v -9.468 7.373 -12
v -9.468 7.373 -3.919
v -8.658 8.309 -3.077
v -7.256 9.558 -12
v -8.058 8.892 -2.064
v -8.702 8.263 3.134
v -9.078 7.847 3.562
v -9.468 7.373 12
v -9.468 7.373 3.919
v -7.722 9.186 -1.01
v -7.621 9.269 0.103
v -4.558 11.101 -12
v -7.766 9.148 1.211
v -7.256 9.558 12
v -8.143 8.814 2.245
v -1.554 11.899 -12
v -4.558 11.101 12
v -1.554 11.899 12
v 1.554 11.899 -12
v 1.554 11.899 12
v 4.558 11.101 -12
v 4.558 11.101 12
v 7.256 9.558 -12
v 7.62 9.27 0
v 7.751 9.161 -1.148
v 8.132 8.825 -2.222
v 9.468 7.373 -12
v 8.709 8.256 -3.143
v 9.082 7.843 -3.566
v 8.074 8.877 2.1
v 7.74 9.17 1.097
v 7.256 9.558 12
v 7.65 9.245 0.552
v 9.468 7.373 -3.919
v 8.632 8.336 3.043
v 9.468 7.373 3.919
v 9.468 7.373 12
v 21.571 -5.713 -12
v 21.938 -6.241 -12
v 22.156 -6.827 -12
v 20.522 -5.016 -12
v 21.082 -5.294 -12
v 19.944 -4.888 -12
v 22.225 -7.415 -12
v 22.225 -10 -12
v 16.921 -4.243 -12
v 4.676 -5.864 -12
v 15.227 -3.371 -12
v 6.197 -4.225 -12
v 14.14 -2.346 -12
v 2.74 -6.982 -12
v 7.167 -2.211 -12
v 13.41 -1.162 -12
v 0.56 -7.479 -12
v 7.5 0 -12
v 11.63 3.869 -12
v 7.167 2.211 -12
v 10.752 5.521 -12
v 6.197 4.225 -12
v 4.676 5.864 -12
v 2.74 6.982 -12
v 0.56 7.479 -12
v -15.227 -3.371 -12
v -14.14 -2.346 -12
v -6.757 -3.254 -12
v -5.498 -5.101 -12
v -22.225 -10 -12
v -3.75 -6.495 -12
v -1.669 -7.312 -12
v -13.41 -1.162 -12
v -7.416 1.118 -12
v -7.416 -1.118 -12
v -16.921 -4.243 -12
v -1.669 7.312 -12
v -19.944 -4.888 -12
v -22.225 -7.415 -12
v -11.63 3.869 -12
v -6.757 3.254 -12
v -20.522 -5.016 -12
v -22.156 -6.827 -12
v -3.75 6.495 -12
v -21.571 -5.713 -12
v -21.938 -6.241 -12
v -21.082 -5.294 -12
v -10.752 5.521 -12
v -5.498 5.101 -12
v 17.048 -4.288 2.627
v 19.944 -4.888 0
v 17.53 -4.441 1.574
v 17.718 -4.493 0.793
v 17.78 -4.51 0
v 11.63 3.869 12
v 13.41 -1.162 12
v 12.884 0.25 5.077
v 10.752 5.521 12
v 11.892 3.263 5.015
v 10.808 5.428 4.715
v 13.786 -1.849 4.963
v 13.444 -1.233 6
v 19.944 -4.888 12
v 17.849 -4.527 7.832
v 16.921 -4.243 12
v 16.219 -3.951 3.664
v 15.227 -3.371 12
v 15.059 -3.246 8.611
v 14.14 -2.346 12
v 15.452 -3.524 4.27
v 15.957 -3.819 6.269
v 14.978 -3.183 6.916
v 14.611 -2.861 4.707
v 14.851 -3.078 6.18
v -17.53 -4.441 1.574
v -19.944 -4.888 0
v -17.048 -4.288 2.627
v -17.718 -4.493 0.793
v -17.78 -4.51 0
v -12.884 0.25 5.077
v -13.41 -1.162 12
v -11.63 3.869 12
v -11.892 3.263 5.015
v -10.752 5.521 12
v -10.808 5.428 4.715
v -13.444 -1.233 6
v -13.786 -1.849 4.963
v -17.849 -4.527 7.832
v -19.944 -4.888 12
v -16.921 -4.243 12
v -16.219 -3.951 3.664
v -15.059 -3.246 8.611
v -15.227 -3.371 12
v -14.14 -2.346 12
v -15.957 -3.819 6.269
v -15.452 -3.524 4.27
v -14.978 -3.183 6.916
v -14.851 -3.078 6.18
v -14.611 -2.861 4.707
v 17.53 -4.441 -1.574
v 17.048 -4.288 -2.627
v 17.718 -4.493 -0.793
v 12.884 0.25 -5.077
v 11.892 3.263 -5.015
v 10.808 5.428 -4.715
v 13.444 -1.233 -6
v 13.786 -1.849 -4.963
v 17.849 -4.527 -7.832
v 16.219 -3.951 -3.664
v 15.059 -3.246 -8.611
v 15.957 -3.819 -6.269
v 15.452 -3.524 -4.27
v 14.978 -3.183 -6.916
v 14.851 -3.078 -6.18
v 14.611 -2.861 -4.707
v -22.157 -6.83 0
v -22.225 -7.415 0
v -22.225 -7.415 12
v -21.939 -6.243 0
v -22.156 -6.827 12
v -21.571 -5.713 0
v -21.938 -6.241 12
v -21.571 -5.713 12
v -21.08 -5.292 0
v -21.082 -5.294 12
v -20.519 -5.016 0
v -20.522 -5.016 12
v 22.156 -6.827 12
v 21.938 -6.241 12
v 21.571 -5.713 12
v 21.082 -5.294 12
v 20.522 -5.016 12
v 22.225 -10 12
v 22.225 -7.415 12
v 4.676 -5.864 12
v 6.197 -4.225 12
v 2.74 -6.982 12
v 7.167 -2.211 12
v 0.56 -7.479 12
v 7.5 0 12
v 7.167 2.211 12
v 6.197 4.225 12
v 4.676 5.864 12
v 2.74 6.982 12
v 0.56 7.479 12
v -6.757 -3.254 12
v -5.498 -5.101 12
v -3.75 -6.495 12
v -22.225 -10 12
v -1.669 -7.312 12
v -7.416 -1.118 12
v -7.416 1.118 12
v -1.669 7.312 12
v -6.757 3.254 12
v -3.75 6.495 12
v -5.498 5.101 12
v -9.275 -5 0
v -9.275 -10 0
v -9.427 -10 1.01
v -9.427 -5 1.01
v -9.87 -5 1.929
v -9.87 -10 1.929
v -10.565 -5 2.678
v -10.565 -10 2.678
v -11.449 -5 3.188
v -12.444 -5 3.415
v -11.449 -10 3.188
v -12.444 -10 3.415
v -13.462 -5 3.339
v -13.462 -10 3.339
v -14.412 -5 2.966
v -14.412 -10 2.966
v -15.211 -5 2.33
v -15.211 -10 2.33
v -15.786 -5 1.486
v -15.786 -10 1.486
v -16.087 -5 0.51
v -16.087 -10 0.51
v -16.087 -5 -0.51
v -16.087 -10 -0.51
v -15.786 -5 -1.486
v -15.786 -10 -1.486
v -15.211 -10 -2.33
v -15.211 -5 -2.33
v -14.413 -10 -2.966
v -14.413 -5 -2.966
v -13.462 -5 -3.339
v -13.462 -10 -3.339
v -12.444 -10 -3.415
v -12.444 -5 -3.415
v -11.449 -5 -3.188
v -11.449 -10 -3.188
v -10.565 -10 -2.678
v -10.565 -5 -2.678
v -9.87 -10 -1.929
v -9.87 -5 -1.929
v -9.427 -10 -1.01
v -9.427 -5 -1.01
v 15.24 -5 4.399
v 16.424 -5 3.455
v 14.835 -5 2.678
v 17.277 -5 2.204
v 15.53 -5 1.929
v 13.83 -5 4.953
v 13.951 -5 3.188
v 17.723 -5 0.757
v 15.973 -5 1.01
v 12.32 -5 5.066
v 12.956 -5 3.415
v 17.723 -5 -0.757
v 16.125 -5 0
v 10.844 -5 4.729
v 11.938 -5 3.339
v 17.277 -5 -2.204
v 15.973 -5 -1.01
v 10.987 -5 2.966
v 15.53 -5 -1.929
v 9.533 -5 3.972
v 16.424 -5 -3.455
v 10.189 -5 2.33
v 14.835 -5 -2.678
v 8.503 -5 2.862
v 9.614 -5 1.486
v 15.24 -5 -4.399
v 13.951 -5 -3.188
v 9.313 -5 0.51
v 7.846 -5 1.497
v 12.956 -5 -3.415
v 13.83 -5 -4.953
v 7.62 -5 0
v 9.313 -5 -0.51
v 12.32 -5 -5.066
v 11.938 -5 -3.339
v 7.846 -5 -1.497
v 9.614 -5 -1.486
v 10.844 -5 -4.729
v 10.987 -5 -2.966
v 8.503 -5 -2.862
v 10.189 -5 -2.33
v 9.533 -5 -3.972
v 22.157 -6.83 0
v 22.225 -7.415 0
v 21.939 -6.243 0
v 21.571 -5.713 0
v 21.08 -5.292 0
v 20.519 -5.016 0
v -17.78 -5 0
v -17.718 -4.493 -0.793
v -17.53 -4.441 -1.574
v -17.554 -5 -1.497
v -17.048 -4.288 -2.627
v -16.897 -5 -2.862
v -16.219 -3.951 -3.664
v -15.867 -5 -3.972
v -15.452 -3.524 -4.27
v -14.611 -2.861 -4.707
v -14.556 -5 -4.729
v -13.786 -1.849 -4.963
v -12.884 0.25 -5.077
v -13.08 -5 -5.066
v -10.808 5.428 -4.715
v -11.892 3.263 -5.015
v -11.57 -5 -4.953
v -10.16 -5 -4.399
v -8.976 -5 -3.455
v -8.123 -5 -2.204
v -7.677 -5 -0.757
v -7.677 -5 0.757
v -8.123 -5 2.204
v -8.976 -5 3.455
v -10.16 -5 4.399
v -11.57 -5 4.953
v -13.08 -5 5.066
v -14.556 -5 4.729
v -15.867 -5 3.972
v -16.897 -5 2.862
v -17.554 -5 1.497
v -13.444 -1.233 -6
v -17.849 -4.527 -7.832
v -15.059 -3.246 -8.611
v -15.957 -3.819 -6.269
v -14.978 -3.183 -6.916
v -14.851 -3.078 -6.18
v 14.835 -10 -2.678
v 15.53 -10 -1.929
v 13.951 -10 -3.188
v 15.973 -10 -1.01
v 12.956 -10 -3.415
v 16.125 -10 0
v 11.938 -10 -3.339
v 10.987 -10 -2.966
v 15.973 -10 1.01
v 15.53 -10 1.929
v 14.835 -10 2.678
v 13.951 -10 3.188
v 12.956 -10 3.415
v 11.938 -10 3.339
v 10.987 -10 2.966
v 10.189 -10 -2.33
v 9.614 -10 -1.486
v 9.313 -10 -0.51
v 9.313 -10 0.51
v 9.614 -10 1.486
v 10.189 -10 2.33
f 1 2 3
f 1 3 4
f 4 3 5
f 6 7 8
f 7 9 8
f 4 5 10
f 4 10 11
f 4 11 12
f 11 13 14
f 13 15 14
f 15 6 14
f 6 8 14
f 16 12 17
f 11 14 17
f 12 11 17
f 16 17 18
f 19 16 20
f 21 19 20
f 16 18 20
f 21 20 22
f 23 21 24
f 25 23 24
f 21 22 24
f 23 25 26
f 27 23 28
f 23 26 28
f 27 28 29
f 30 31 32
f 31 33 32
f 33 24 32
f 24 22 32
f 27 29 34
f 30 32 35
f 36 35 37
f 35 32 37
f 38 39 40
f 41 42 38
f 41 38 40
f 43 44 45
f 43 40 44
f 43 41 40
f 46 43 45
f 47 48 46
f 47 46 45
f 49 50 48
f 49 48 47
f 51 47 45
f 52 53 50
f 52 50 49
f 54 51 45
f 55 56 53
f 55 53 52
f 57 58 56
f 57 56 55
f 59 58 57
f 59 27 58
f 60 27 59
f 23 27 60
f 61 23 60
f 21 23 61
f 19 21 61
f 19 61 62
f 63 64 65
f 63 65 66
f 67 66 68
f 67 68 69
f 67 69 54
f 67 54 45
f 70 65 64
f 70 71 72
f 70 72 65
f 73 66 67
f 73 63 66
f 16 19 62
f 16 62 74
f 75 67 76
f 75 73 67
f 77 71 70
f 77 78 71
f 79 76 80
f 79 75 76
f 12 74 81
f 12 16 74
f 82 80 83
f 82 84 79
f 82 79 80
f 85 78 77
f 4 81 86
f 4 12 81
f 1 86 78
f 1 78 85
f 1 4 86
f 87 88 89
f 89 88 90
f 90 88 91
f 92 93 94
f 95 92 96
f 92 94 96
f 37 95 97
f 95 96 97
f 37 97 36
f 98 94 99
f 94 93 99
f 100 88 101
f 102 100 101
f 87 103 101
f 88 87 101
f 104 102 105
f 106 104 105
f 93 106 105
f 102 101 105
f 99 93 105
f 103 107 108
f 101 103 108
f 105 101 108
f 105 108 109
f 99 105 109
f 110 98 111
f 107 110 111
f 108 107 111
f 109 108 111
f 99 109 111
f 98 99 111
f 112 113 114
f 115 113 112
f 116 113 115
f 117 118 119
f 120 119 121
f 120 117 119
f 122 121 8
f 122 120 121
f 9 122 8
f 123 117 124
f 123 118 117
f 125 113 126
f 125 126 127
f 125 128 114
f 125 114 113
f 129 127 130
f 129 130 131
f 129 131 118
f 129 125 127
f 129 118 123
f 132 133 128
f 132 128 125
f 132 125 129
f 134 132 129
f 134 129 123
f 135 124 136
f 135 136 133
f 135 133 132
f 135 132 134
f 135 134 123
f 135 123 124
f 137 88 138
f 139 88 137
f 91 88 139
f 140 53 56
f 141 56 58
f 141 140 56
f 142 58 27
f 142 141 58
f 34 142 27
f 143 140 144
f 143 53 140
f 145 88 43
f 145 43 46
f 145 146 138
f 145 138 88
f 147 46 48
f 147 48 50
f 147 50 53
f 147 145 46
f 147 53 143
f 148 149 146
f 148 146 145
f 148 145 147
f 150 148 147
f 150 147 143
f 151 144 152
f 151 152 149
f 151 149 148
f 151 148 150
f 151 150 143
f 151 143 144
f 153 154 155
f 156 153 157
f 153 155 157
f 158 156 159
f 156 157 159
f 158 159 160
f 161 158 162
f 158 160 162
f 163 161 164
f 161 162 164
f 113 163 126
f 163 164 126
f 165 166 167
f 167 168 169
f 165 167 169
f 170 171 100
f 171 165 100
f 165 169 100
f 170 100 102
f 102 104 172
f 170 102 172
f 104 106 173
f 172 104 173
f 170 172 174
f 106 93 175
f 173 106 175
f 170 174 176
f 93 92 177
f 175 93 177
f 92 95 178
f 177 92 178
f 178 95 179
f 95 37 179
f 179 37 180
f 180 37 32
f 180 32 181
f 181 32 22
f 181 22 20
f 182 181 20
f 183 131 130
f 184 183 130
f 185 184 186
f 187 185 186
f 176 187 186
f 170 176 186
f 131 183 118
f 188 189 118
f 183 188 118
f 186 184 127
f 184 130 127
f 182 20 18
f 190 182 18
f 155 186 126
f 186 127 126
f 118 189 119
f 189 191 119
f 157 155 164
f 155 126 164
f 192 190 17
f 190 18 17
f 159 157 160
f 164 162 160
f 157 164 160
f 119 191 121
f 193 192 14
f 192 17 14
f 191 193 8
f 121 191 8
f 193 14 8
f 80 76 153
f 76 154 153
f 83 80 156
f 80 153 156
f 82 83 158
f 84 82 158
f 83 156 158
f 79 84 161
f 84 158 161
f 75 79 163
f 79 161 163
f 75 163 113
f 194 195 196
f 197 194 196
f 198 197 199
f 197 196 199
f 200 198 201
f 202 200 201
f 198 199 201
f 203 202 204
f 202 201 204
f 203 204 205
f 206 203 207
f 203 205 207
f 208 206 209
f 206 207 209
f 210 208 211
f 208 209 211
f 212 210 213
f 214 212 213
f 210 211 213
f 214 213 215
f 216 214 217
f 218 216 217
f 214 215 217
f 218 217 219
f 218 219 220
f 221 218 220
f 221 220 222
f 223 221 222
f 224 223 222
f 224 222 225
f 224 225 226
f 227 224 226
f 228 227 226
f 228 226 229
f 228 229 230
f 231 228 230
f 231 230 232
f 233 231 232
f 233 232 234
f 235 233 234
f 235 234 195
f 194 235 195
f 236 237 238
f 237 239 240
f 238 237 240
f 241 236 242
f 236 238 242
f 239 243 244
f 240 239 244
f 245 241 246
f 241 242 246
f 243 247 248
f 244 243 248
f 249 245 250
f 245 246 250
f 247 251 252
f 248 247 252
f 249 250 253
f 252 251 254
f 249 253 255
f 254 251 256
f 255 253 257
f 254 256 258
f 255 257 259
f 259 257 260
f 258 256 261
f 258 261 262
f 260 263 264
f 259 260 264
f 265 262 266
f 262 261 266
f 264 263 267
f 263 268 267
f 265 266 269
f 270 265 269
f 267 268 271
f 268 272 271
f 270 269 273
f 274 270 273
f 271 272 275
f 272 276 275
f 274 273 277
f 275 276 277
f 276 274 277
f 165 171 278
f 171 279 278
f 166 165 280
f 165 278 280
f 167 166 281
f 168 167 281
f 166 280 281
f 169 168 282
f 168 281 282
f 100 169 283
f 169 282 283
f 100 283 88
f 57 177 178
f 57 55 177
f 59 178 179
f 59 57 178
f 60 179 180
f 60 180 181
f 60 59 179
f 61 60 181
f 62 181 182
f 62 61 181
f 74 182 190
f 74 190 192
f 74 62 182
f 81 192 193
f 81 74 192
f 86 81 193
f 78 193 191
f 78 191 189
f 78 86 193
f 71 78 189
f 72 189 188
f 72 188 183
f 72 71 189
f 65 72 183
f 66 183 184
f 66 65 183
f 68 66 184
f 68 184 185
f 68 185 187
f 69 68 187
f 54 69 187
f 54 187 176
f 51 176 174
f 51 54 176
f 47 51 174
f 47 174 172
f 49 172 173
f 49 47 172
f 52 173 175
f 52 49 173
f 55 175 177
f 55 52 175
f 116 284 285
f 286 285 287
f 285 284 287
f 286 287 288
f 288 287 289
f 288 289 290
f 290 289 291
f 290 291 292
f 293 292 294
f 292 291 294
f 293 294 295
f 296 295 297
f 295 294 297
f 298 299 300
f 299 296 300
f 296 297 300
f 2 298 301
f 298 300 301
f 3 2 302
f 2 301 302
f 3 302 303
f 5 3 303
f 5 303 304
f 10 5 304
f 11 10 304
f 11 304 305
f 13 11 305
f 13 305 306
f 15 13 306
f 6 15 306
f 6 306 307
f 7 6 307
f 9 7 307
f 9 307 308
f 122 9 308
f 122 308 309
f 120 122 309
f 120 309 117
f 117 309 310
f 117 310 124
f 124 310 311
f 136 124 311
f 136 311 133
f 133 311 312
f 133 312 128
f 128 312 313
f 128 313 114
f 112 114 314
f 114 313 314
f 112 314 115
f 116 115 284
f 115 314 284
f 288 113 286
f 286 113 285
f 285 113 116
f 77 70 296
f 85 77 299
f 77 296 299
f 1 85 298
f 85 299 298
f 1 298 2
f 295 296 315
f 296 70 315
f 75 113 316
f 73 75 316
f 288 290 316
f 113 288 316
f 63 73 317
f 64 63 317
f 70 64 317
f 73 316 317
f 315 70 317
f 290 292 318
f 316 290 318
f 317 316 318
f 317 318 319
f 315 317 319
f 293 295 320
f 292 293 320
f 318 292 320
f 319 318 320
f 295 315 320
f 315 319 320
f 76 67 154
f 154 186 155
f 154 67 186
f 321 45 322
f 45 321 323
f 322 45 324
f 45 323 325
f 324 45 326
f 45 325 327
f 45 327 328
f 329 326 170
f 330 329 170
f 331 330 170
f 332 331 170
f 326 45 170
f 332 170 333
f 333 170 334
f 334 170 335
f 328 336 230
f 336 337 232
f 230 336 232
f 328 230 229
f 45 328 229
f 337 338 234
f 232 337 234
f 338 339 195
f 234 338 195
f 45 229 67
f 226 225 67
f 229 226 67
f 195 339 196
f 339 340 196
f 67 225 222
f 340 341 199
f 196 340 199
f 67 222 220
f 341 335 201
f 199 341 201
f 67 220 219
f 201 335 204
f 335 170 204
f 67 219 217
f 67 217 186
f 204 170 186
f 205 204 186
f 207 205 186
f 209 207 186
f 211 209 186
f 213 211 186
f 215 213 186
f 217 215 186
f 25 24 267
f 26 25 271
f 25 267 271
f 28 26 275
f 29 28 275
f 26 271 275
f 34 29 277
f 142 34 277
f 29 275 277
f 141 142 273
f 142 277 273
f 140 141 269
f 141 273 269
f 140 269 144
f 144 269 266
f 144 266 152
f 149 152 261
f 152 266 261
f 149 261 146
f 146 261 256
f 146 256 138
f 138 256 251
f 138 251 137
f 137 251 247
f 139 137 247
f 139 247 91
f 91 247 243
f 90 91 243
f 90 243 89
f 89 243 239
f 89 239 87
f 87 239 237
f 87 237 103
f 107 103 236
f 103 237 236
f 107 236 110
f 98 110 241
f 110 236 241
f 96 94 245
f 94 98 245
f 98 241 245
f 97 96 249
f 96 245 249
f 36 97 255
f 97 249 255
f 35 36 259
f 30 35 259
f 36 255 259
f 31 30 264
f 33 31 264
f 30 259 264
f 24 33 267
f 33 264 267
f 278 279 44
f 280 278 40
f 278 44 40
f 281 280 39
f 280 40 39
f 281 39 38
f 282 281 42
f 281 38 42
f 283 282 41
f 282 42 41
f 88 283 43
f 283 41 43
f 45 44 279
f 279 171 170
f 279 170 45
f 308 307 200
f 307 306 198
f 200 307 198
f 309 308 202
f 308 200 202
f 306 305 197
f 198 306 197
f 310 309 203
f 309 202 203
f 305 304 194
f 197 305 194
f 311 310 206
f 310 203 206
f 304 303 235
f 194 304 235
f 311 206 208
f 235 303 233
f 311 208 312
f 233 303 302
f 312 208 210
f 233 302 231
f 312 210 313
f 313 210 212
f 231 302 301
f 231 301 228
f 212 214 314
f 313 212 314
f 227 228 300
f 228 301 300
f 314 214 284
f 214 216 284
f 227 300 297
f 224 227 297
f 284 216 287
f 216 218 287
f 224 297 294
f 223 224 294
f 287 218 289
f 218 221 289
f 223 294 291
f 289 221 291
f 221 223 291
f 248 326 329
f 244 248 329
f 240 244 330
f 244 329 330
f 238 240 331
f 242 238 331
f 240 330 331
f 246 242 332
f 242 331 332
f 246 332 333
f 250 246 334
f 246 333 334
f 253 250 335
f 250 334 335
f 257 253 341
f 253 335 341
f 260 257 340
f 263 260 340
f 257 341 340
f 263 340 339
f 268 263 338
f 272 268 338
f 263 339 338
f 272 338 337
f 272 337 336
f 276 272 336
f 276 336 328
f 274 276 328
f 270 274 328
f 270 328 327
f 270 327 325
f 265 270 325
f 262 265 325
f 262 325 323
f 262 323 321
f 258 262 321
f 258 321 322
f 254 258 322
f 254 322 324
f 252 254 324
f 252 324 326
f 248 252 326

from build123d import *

# Parameters (mm, degrees)
SKETCH1_R           = 7.5
BOSS_EXTRUDE1_DEPTH = 12
SKETCH3_R           = 3.425
CUT_EXTRUDE1_DEPTH  = 23.0000001
FILLET1_R           = 2.54
SKETCH4_R           = 5.08
CUT_EXTRUDE2_DEPTH  = 18.000000194


with BuildPart() as part:
    # Sketch1 → Boss-Extrude1 (new body, symmetric)
    with BuildSketch(Plane.XY):
        with BuildLine():
            Line((22.225, -10), (-22.225, -10))
            Line((-22.225, -10), (-22.225, -5))
            add(Edge.make_bspline(
                [(-22.225, -5), (-16.631079064, -4.98201906), (-12.322747723, -1.728386223), (-12.530535341, 3.440374129), (-9.467504716, 7.373354356)],
                knots=[0, 0, 0, 0, 0.501954987, 1, 1, 1, 1], degree=3))
            ThreePointArc((-9.467504716, 7.373354356), (0, 12), (9.467504716, 7.373354356))
            add(Edge.make_bspline(
                [(22.225, -5), (16.631079064, -4.98201906), (12.322747723, -1.728386223), (12.530535341, 3.440374129), (9.467504716, 7.373354356)],
                knots=[0, 0, 0, 0, 0.501954987, 1, 1, 1, 1], degree=3))
            Line((22.225, -5), (22.225, -10))
        make_face()
        Circle(SKETCH1_R, mode=Mode.SUBTRACT)
    extrude(amount=BOSS_EXTRUDE1_DEPTH, both=True)

    # Sketch3 → Cut-Extrude1 (cut, through all)
    with BuildSketch(Plane.XZ.offset(10)):
        with Locations((-12.7, 0)):
            Circle(SKETCH3_R)
        with Locations((12.7, 0)):
            Circle(SKETCH3_R)
    extrude(amount=-CUT_EXTRUDE1_DEPTH, mode=Mode.SUBTRACT)

    # Fillet1
    fillet1_edges = [part.edges().sort_by_distance(p)[0] for p in [
        (22.225, -5, -6),
        (-22.225, -5, 6),
    ]]
    fillet(fillet1_edges, radius=FILLET1_R)

    # Sketch4 → Cut-Extrude2 (cut, through all)
    with BuildSketch(Plane(origin=(0, -5.000000094, 0), x_dir=(-1, 0, 0), z_dir=(0, -1, 0))):
        with Locations((12.7, 0)):
            Circle(SKETCH4_R)
        with Locations((-12.7, 0)):
            Circle(SKETCH4_R)
    extrude(amount=-CUT_EXTRUDE2_DEPTH, mode=Mode.SUBTRACT)


solid = part.part
